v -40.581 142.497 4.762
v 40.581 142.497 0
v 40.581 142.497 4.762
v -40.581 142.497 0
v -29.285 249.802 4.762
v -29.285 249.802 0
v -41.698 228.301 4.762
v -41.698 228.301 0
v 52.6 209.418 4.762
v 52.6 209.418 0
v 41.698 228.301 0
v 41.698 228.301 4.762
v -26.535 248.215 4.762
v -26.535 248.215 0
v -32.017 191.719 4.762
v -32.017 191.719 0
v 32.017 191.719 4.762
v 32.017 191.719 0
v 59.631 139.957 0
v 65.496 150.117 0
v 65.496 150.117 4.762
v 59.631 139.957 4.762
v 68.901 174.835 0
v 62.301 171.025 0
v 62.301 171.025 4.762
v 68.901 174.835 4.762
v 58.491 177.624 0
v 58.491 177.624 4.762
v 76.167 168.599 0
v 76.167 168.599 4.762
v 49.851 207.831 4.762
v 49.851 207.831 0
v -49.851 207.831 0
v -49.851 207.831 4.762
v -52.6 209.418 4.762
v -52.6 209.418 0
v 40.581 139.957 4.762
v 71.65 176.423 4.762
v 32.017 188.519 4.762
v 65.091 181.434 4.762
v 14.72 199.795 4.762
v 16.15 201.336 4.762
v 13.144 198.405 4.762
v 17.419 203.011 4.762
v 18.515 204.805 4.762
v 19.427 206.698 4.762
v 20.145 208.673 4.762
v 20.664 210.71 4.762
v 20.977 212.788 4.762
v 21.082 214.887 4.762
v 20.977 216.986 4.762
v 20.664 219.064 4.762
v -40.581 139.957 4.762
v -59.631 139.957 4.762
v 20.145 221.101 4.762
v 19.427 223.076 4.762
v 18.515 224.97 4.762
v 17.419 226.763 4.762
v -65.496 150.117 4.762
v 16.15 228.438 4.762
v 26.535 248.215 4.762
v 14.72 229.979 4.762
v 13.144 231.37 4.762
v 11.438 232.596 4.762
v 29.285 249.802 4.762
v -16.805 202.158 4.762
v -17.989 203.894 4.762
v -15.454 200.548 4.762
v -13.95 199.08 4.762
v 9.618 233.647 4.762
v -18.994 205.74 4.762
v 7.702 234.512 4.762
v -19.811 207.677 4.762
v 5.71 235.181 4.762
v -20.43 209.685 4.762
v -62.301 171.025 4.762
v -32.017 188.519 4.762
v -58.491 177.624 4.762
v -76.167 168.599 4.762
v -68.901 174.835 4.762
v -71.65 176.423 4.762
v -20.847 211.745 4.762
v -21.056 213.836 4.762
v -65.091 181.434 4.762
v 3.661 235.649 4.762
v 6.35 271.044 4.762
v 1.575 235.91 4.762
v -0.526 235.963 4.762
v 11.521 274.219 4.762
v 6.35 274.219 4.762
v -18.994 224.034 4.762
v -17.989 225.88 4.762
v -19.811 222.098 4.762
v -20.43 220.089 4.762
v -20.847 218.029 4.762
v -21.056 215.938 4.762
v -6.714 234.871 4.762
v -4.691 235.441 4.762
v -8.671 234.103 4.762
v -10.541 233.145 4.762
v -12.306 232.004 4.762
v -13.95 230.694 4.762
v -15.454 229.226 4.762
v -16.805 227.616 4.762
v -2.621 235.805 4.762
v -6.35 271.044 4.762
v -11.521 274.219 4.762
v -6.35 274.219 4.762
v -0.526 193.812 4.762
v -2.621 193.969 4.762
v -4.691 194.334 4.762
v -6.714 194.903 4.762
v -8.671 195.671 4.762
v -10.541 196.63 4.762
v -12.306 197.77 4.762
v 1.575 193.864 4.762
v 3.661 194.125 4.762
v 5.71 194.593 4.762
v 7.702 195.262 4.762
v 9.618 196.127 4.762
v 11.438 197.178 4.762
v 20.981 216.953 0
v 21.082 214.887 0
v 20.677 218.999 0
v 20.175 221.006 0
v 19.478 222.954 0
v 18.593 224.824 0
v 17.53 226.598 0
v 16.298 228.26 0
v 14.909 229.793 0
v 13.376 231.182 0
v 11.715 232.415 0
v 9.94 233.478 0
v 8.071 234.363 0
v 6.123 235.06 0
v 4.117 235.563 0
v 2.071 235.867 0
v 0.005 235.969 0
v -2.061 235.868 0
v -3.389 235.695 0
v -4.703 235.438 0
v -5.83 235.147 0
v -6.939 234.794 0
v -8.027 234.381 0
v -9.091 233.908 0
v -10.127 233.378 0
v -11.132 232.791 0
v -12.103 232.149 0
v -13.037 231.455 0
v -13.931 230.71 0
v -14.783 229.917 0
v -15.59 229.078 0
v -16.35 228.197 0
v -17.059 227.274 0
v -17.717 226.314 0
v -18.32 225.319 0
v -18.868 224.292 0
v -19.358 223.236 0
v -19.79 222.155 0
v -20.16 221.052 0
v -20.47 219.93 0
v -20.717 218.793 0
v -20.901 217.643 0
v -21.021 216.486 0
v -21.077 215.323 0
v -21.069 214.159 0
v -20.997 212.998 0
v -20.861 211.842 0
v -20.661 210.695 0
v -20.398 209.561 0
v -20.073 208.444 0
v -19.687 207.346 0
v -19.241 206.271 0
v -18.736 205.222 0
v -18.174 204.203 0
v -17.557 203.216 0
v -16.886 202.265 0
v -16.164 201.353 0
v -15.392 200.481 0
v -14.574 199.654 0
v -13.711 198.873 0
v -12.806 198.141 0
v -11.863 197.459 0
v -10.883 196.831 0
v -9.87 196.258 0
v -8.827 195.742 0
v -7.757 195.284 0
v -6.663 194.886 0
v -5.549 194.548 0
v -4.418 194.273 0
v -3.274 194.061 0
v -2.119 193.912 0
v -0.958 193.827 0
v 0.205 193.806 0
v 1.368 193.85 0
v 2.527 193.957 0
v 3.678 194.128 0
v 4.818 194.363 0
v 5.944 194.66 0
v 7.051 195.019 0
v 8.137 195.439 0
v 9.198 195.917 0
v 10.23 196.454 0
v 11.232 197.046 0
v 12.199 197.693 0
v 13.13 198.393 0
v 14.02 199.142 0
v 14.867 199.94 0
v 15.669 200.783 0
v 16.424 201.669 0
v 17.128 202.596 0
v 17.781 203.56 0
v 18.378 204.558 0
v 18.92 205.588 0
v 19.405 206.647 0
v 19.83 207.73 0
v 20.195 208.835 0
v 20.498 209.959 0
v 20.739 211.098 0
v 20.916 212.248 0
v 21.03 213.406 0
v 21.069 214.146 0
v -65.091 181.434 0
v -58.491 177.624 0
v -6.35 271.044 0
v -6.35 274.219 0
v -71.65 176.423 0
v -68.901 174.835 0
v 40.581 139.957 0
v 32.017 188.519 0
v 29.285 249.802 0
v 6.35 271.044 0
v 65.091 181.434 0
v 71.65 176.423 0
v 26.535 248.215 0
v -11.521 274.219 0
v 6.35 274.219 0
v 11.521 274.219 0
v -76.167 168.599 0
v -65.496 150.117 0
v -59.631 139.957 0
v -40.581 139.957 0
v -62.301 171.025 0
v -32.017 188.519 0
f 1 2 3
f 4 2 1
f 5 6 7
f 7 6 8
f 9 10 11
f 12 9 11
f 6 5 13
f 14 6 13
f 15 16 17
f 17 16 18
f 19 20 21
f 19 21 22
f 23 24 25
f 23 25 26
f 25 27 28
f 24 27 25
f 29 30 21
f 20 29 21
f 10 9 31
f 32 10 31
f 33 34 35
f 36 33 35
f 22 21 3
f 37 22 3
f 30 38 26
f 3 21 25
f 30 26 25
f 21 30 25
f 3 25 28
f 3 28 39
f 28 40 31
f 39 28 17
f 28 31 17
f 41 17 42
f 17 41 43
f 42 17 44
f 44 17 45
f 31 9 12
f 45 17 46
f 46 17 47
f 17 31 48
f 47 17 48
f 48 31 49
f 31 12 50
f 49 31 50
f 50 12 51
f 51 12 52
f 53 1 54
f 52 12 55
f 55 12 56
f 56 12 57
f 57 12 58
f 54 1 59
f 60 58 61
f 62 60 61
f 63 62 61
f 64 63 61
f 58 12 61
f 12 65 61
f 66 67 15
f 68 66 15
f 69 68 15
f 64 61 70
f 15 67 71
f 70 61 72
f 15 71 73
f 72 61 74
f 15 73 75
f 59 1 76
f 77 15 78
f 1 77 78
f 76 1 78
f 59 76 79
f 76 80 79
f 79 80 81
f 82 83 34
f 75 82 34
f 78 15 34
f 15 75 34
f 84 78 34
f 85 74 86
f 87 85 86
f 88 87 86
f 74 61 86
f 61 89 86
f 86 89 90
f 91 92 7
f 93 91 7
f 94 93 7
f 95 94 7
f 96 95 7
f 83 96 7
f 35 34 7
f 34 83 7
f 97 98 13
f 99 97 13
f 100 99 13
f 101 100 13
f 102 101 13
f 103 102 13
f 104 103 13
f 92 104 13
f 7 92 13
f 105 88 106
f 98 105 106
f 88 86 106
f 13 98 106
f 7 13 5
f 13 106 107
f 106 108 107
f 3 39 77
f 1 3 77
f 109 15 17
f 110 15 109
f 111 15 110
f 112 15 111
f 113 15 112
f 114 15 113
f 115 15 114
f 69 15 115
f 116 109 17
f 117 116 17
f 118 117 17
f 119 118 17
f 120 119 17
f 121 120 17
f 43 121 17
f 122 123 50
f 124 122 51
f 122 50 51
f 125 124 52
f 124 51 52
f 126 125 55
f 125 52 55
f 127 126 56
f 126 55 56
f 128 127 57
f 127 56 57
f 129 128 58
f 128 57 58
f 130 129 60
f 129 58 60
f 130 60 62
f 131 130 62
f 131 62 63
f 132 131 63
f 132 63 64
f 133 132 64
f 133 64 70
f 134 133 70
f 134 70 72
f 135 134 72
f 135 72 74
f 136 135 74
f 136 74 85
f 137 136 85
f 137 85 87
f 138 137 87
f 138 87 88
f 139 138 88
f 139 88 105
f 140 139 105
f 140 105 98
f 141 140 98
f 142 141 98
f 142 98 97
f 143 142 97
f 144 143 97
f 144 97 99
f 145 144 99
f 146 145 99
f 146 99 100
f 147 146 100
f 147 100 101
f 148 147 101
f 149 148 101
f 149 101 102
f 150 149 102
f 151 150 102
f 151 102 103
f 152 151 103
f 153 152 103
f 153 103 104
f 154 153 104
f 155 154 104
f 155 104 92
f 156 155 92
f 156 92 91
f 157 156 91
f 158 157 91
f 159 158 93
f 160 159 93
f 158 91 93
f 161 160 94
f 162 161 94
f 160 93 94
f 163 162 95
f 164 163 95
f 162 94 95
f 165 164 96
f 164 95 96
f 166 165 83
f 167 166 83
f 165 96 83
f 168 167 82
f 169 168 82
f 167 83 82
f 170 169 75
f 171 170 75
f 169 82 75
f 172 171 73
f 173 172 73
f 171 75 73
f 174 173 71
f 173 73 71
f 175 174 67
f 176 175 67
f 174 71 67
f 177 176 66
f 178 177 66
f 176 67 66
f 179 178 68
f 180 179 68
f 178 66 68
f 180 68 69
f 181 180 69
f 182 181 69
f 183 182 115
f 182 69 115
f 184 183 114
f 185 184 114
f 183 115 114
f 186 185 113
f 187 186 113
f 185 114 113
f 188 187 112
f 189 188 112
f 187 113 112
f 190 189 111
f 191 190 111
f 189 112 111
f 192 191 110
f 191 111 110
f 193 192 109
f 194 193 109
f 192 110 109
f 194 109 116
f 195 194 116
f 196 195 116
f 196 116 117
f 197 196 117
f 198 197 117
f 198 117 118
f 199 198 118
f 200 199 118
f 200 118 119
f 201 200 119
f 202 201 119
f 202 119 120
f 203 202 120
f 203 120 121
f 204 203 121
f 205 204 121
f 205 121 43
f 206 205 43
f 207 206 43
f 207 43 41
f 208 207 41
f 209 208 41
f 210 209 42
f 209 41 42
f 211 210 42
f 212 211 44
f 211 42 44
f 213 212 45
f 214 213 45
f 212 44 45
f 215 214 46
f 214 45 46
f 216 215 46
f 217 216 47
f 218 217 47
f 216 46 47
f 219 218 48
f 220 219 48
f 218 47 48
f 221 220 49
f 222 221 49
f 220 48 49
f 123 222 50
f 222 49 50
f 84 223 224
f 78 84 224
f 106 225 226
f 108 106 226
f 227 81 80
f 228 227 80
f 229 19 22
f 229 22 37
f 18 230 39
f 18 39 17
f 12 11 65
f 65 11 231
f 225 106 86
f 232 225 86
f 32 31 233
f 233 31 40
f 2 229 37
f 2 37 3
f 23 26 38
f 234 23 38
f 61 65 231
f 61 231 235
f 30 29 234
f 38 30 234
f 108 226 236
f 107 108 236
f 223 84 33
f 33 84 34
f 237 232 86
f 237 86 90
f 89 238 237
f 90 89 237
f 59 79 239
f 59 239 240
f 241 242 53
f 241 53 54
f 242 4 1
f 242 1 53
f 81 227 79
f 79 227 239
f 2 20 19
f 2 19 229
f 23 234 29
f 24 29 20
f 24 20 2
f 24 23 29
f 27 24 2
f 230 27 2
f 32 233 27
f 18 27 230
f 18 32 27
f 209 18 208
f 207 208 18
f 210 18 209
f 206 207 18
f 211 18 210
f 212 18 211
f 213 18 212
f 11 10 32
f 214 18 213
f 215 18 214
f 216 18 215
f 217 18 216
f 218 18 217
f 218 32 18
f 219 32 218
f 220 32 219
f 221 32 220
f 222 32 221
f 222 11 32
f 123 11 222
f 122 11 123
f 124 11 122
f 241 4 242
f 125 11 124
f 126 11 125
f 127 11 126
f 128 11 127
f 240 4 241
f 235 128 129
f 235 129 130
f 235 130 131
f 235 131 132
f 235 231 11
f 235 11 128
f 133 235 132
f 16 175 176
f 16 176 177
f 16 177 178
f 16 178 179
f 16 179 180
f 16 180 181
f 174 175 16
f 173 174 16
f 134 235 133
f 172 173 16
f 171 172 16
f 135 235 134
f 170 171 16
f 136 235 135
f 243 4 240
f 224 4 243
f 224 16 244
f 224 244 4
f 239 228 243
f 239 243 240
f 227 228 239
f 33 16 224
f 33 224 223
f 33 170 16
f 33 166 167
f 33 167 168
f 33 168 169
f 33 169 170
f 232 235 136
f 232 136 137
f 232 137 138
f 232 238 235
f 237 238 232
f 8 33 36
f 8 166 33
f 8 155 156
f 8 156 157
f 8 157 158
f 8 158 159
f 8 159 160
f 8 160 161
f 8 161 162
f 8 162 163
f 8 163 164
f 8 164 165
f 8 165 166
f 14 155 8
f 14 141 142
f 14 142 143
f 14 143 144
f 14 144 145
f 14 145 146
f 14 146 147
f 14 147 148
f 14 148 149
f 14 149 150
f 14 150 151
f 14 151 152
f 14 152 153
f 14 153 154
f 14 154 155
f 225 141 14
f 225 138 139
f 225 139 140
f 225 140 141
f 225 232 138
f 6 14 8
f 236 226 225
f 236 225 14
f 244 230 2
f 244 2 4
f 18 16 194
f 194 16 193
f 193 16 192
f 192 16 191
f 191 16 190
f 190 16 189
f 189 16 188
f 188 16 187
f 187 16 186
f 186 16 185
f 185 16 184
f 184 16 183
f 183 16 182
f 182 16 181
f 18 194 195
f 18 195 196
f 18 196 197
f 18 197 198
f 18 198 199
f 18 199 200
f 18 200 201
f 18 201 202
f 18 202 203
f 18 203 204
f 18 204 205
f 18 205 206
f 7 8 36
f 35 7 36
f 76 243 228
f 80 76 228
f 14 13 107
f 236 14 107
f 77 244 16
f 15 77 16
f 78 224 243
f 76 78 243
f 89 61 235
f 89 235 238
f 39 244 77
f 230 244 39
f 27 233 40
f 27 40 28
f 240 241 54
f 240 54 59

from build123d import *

# Parameters (mm, degrees)
BOSS_EXTRUDE1_DEPTH     = 4.7625
SCALE2_SCALE_X          = 0.25
SCALE2_SCALE_Y          = 0.25
SCALE2_SCALE_Z          = 1
SKETCH8_R               = 21.082
CUT_EXTRUDE5_DEPTH      = 286.136245759
CUT_EXTRUDE8_DEPTH      = 286.136245759
CUT_EXTRUDE8_DEPTH_BACK = 286.136245759
SKETCH9_W               = 64.0334
SKETCH9_H               = 3.2004
SKETCH10_W              = 12.7
SKETCH10_H              = 3.175
CUT_EXTRUDE9_DEPTH      = 286.136245759
CUT_EXTRUDE10_DEPTH     = 286.136245759
CUT_EXTRUDE11_DEPTH     = 286.136245759
CUT_EXTRUDE12_DEPTH     = 286.136245759
SKETCH18_W              = 40.580539391
SKETCH18_H              = 7.62
BOSS_EXTRUDE2_DEPTH     = 4.7625
CUT_EXTRUDE13_REACH     = 286.64


with BuildPart() as part:
    # Sketch3 → Boss-Extrude1 (new body)
    with BuildSketch(Plane.XY):
        Polygon((312.000738686, 65.991135768), (166.792028218, 317.5), (-166.792028218, 317.5), (-312.000738686, 65.991135768), (-276.650369343, 4.7625), (276.650369343, 4.7625), align=None)
        Polygon((-166.792028218, 317.5), (166.792028218, 317.5), (60.750369343, 501.169540891), (-60.750369343, 501.169540891), align=None)
    extrude(amount=BOSS_EXTRUDE1_DEPTH)


with BuildPart() as part_1:
    # Scale2: scaled about (0, 198.568597006, 2.38125)
    add(part.part.scale((SCALE2_SCALE_X, SCALE2_SCALE_Y, SCALE2_SCALE_Z), about=(0, 198.568597006, 2.38125)))

    # Sketch8 → Cut-Extrude5 (cut, through all)
    with BuildSketch(Plane.XY.offset(4.7625)):
        with Locations((0, 214.887072754)):
            Circle(SKETCH8_R)
    extrude(amount=-CUT_EXTRUDE5_DEPTH, mode=Mode.SUBTRACT)

    # Sketch9 → Cut-Extrude8 (cut, two sides: drawn at the far end of the back side and taken through both)
    with BuildSketch(Plane.XY.offset(4.7625).offset(-CUT_EXTRUDE8_DEPTH_BACK)):
        with Locations((0, 190.118897754)):
            Rectangle(SKETCH9_W, SKETCH9_H)
    extrude(amount=CUT_EXTRUDE8_DEPTH + CUT_EXTRUDE8_DEPTH_BACK, mode=Mode.SUBTRACT)

    # Sketch10 → Cut-Extrude9 (cut, through all)
    with BuildSketch(Plane.XY.offset(4.7625)):
        with Locations((0, 272.631332977)):
            Rectangle(SKETCH10_W, SKETCH10_H)
    extrude(amount=-CUT_EXTRUDE9_DEPTH, mode=Mode.SUBTRACT)

    # Sketch11 → Cut-Extrude10 (cut, through all)
    with BuildSketch(Plane.XY.offset(4.7625)):
        Polygon((15.187592336, 274.218832977), (29.284592336, 249.802112743), (26.534961679, 248.214612743), (11.521418126, 274.218832977), align=None)
        Polygon((-29.284592336, 249.802112743), (-26.534961679, 248.214612743), (-11.521418126, 274.218832977), (-15.187592336, 274.218832977), align=None)
    extrude(amount=-CUT_EXTRUDE10_DEPTH, mode=Mode.SUBTRACT)

    # Sketch12 → Cut-Extrude11 (cut, through all)
    with BuildSketch(Plane.XY.offset(4.7625)):
        Polygon((71.650184671, 176.422754325), (52.600184671, 209.418322209), (49.850554014, 207.830822209), (68.900554014, 174.835254325), align=None)
        Polygon((-71.650184671, 176.422754325), (-68.900554014, 174.835254325), (-49.850554014, 207.830822209), (-52.600184671, 209.418322209), align=None)
    extrude(amount=-CUT_EXTRUDE11_DEPTH, mode=Mode.SUBTRACT)

    # Sketch13 → Cut-Extrude12 (cut, through all)
    with BuildSketch(Plane.XY.offset(4.7625)):
        Polygon((78.000184671, 165.424231696), (76.167097567, 168.599231696), (62.550554014, 145.01468644), (65.300184671, 143.42718644), align=None)
        Polygon((-62.550554014, 145.01468644), (-65.300184671, 143.42718644), (-78.000184671, 165.424231696), (-76.167097567, 168.599231696), align=None)
    extrude(amount=-CUT_EXTRUDE12_DEPTH, mode=Mode.SUBTRACT)

    # Sketch18 → Boss-Extrude2 (add)
    with BuildSketch(Plane(origin=(0, 0, 0), x_dir=(-1, 0, 0), z_dir=(0, 0, -1))):
        Polygon((-40.580539391, 150.117072754), (-65.496418126, 150.117072754), (-59.630539391, 139.957072754), (-40.580539391, 139.957072754), (-40.580539391, 142.497072754), align=None)
        with Locations((-20.290269696, 146.307072754)):
            Rectangle(SKETCH18_W, SKETCH18_H)
        with Locations((20.290269696, 146.307072754)):
            Rectangle(SKETCH18_W, SKETCH18_H)
        Polygon((65.496418126, 150.117072754), (40.580539391, 150.117072754), (40.580539391, 142.497072754), (40.580539391, 139.957072754), (59.630539391, 139.957072754), align=None)
    extrude(amount=-BOSS_EXTRUDE2_DEPTH)

    # Sketch20 → Cut-Extrude13 (cut, up to next)
    with BuildSketch(Plane(origin=(0, 0, 0), x_dir=(-1, 0, 0), z_dir=(0, 0, -1)), mode=Mode.PRIVATE) as cut_extrude13_sk1:
        Polygon((68.900554014, 174.835254325), (65.090554014, 181.434367901), (58.491440438, 177.624367901), (62.301440438, 171.025254325), align=None)
    cut_extrude13_tool1 = extrude(cut_extrude13_sk1.sketch, amount=-CUT_EXTRUDE13_REACH, mode=Mode.PRIVATE) & part_1.part
    cut_extrude13 = cut_extrude13_tool1.solids().sort_by_distance((-63.695997, 176.229811, 0))[0]
    add(cut_extrude13, mode=Mode.SUBTRACT)

    # Mirror1: Cut-Extrude13 across plane
    add(cut_extrude13.mirror(Plane(origin=(0, 0, 0), x_dir=(0, 0, 1), z_dir=(1, 0, 0))), mode=Mode.SUBTRACT)


solid = part_1.part
